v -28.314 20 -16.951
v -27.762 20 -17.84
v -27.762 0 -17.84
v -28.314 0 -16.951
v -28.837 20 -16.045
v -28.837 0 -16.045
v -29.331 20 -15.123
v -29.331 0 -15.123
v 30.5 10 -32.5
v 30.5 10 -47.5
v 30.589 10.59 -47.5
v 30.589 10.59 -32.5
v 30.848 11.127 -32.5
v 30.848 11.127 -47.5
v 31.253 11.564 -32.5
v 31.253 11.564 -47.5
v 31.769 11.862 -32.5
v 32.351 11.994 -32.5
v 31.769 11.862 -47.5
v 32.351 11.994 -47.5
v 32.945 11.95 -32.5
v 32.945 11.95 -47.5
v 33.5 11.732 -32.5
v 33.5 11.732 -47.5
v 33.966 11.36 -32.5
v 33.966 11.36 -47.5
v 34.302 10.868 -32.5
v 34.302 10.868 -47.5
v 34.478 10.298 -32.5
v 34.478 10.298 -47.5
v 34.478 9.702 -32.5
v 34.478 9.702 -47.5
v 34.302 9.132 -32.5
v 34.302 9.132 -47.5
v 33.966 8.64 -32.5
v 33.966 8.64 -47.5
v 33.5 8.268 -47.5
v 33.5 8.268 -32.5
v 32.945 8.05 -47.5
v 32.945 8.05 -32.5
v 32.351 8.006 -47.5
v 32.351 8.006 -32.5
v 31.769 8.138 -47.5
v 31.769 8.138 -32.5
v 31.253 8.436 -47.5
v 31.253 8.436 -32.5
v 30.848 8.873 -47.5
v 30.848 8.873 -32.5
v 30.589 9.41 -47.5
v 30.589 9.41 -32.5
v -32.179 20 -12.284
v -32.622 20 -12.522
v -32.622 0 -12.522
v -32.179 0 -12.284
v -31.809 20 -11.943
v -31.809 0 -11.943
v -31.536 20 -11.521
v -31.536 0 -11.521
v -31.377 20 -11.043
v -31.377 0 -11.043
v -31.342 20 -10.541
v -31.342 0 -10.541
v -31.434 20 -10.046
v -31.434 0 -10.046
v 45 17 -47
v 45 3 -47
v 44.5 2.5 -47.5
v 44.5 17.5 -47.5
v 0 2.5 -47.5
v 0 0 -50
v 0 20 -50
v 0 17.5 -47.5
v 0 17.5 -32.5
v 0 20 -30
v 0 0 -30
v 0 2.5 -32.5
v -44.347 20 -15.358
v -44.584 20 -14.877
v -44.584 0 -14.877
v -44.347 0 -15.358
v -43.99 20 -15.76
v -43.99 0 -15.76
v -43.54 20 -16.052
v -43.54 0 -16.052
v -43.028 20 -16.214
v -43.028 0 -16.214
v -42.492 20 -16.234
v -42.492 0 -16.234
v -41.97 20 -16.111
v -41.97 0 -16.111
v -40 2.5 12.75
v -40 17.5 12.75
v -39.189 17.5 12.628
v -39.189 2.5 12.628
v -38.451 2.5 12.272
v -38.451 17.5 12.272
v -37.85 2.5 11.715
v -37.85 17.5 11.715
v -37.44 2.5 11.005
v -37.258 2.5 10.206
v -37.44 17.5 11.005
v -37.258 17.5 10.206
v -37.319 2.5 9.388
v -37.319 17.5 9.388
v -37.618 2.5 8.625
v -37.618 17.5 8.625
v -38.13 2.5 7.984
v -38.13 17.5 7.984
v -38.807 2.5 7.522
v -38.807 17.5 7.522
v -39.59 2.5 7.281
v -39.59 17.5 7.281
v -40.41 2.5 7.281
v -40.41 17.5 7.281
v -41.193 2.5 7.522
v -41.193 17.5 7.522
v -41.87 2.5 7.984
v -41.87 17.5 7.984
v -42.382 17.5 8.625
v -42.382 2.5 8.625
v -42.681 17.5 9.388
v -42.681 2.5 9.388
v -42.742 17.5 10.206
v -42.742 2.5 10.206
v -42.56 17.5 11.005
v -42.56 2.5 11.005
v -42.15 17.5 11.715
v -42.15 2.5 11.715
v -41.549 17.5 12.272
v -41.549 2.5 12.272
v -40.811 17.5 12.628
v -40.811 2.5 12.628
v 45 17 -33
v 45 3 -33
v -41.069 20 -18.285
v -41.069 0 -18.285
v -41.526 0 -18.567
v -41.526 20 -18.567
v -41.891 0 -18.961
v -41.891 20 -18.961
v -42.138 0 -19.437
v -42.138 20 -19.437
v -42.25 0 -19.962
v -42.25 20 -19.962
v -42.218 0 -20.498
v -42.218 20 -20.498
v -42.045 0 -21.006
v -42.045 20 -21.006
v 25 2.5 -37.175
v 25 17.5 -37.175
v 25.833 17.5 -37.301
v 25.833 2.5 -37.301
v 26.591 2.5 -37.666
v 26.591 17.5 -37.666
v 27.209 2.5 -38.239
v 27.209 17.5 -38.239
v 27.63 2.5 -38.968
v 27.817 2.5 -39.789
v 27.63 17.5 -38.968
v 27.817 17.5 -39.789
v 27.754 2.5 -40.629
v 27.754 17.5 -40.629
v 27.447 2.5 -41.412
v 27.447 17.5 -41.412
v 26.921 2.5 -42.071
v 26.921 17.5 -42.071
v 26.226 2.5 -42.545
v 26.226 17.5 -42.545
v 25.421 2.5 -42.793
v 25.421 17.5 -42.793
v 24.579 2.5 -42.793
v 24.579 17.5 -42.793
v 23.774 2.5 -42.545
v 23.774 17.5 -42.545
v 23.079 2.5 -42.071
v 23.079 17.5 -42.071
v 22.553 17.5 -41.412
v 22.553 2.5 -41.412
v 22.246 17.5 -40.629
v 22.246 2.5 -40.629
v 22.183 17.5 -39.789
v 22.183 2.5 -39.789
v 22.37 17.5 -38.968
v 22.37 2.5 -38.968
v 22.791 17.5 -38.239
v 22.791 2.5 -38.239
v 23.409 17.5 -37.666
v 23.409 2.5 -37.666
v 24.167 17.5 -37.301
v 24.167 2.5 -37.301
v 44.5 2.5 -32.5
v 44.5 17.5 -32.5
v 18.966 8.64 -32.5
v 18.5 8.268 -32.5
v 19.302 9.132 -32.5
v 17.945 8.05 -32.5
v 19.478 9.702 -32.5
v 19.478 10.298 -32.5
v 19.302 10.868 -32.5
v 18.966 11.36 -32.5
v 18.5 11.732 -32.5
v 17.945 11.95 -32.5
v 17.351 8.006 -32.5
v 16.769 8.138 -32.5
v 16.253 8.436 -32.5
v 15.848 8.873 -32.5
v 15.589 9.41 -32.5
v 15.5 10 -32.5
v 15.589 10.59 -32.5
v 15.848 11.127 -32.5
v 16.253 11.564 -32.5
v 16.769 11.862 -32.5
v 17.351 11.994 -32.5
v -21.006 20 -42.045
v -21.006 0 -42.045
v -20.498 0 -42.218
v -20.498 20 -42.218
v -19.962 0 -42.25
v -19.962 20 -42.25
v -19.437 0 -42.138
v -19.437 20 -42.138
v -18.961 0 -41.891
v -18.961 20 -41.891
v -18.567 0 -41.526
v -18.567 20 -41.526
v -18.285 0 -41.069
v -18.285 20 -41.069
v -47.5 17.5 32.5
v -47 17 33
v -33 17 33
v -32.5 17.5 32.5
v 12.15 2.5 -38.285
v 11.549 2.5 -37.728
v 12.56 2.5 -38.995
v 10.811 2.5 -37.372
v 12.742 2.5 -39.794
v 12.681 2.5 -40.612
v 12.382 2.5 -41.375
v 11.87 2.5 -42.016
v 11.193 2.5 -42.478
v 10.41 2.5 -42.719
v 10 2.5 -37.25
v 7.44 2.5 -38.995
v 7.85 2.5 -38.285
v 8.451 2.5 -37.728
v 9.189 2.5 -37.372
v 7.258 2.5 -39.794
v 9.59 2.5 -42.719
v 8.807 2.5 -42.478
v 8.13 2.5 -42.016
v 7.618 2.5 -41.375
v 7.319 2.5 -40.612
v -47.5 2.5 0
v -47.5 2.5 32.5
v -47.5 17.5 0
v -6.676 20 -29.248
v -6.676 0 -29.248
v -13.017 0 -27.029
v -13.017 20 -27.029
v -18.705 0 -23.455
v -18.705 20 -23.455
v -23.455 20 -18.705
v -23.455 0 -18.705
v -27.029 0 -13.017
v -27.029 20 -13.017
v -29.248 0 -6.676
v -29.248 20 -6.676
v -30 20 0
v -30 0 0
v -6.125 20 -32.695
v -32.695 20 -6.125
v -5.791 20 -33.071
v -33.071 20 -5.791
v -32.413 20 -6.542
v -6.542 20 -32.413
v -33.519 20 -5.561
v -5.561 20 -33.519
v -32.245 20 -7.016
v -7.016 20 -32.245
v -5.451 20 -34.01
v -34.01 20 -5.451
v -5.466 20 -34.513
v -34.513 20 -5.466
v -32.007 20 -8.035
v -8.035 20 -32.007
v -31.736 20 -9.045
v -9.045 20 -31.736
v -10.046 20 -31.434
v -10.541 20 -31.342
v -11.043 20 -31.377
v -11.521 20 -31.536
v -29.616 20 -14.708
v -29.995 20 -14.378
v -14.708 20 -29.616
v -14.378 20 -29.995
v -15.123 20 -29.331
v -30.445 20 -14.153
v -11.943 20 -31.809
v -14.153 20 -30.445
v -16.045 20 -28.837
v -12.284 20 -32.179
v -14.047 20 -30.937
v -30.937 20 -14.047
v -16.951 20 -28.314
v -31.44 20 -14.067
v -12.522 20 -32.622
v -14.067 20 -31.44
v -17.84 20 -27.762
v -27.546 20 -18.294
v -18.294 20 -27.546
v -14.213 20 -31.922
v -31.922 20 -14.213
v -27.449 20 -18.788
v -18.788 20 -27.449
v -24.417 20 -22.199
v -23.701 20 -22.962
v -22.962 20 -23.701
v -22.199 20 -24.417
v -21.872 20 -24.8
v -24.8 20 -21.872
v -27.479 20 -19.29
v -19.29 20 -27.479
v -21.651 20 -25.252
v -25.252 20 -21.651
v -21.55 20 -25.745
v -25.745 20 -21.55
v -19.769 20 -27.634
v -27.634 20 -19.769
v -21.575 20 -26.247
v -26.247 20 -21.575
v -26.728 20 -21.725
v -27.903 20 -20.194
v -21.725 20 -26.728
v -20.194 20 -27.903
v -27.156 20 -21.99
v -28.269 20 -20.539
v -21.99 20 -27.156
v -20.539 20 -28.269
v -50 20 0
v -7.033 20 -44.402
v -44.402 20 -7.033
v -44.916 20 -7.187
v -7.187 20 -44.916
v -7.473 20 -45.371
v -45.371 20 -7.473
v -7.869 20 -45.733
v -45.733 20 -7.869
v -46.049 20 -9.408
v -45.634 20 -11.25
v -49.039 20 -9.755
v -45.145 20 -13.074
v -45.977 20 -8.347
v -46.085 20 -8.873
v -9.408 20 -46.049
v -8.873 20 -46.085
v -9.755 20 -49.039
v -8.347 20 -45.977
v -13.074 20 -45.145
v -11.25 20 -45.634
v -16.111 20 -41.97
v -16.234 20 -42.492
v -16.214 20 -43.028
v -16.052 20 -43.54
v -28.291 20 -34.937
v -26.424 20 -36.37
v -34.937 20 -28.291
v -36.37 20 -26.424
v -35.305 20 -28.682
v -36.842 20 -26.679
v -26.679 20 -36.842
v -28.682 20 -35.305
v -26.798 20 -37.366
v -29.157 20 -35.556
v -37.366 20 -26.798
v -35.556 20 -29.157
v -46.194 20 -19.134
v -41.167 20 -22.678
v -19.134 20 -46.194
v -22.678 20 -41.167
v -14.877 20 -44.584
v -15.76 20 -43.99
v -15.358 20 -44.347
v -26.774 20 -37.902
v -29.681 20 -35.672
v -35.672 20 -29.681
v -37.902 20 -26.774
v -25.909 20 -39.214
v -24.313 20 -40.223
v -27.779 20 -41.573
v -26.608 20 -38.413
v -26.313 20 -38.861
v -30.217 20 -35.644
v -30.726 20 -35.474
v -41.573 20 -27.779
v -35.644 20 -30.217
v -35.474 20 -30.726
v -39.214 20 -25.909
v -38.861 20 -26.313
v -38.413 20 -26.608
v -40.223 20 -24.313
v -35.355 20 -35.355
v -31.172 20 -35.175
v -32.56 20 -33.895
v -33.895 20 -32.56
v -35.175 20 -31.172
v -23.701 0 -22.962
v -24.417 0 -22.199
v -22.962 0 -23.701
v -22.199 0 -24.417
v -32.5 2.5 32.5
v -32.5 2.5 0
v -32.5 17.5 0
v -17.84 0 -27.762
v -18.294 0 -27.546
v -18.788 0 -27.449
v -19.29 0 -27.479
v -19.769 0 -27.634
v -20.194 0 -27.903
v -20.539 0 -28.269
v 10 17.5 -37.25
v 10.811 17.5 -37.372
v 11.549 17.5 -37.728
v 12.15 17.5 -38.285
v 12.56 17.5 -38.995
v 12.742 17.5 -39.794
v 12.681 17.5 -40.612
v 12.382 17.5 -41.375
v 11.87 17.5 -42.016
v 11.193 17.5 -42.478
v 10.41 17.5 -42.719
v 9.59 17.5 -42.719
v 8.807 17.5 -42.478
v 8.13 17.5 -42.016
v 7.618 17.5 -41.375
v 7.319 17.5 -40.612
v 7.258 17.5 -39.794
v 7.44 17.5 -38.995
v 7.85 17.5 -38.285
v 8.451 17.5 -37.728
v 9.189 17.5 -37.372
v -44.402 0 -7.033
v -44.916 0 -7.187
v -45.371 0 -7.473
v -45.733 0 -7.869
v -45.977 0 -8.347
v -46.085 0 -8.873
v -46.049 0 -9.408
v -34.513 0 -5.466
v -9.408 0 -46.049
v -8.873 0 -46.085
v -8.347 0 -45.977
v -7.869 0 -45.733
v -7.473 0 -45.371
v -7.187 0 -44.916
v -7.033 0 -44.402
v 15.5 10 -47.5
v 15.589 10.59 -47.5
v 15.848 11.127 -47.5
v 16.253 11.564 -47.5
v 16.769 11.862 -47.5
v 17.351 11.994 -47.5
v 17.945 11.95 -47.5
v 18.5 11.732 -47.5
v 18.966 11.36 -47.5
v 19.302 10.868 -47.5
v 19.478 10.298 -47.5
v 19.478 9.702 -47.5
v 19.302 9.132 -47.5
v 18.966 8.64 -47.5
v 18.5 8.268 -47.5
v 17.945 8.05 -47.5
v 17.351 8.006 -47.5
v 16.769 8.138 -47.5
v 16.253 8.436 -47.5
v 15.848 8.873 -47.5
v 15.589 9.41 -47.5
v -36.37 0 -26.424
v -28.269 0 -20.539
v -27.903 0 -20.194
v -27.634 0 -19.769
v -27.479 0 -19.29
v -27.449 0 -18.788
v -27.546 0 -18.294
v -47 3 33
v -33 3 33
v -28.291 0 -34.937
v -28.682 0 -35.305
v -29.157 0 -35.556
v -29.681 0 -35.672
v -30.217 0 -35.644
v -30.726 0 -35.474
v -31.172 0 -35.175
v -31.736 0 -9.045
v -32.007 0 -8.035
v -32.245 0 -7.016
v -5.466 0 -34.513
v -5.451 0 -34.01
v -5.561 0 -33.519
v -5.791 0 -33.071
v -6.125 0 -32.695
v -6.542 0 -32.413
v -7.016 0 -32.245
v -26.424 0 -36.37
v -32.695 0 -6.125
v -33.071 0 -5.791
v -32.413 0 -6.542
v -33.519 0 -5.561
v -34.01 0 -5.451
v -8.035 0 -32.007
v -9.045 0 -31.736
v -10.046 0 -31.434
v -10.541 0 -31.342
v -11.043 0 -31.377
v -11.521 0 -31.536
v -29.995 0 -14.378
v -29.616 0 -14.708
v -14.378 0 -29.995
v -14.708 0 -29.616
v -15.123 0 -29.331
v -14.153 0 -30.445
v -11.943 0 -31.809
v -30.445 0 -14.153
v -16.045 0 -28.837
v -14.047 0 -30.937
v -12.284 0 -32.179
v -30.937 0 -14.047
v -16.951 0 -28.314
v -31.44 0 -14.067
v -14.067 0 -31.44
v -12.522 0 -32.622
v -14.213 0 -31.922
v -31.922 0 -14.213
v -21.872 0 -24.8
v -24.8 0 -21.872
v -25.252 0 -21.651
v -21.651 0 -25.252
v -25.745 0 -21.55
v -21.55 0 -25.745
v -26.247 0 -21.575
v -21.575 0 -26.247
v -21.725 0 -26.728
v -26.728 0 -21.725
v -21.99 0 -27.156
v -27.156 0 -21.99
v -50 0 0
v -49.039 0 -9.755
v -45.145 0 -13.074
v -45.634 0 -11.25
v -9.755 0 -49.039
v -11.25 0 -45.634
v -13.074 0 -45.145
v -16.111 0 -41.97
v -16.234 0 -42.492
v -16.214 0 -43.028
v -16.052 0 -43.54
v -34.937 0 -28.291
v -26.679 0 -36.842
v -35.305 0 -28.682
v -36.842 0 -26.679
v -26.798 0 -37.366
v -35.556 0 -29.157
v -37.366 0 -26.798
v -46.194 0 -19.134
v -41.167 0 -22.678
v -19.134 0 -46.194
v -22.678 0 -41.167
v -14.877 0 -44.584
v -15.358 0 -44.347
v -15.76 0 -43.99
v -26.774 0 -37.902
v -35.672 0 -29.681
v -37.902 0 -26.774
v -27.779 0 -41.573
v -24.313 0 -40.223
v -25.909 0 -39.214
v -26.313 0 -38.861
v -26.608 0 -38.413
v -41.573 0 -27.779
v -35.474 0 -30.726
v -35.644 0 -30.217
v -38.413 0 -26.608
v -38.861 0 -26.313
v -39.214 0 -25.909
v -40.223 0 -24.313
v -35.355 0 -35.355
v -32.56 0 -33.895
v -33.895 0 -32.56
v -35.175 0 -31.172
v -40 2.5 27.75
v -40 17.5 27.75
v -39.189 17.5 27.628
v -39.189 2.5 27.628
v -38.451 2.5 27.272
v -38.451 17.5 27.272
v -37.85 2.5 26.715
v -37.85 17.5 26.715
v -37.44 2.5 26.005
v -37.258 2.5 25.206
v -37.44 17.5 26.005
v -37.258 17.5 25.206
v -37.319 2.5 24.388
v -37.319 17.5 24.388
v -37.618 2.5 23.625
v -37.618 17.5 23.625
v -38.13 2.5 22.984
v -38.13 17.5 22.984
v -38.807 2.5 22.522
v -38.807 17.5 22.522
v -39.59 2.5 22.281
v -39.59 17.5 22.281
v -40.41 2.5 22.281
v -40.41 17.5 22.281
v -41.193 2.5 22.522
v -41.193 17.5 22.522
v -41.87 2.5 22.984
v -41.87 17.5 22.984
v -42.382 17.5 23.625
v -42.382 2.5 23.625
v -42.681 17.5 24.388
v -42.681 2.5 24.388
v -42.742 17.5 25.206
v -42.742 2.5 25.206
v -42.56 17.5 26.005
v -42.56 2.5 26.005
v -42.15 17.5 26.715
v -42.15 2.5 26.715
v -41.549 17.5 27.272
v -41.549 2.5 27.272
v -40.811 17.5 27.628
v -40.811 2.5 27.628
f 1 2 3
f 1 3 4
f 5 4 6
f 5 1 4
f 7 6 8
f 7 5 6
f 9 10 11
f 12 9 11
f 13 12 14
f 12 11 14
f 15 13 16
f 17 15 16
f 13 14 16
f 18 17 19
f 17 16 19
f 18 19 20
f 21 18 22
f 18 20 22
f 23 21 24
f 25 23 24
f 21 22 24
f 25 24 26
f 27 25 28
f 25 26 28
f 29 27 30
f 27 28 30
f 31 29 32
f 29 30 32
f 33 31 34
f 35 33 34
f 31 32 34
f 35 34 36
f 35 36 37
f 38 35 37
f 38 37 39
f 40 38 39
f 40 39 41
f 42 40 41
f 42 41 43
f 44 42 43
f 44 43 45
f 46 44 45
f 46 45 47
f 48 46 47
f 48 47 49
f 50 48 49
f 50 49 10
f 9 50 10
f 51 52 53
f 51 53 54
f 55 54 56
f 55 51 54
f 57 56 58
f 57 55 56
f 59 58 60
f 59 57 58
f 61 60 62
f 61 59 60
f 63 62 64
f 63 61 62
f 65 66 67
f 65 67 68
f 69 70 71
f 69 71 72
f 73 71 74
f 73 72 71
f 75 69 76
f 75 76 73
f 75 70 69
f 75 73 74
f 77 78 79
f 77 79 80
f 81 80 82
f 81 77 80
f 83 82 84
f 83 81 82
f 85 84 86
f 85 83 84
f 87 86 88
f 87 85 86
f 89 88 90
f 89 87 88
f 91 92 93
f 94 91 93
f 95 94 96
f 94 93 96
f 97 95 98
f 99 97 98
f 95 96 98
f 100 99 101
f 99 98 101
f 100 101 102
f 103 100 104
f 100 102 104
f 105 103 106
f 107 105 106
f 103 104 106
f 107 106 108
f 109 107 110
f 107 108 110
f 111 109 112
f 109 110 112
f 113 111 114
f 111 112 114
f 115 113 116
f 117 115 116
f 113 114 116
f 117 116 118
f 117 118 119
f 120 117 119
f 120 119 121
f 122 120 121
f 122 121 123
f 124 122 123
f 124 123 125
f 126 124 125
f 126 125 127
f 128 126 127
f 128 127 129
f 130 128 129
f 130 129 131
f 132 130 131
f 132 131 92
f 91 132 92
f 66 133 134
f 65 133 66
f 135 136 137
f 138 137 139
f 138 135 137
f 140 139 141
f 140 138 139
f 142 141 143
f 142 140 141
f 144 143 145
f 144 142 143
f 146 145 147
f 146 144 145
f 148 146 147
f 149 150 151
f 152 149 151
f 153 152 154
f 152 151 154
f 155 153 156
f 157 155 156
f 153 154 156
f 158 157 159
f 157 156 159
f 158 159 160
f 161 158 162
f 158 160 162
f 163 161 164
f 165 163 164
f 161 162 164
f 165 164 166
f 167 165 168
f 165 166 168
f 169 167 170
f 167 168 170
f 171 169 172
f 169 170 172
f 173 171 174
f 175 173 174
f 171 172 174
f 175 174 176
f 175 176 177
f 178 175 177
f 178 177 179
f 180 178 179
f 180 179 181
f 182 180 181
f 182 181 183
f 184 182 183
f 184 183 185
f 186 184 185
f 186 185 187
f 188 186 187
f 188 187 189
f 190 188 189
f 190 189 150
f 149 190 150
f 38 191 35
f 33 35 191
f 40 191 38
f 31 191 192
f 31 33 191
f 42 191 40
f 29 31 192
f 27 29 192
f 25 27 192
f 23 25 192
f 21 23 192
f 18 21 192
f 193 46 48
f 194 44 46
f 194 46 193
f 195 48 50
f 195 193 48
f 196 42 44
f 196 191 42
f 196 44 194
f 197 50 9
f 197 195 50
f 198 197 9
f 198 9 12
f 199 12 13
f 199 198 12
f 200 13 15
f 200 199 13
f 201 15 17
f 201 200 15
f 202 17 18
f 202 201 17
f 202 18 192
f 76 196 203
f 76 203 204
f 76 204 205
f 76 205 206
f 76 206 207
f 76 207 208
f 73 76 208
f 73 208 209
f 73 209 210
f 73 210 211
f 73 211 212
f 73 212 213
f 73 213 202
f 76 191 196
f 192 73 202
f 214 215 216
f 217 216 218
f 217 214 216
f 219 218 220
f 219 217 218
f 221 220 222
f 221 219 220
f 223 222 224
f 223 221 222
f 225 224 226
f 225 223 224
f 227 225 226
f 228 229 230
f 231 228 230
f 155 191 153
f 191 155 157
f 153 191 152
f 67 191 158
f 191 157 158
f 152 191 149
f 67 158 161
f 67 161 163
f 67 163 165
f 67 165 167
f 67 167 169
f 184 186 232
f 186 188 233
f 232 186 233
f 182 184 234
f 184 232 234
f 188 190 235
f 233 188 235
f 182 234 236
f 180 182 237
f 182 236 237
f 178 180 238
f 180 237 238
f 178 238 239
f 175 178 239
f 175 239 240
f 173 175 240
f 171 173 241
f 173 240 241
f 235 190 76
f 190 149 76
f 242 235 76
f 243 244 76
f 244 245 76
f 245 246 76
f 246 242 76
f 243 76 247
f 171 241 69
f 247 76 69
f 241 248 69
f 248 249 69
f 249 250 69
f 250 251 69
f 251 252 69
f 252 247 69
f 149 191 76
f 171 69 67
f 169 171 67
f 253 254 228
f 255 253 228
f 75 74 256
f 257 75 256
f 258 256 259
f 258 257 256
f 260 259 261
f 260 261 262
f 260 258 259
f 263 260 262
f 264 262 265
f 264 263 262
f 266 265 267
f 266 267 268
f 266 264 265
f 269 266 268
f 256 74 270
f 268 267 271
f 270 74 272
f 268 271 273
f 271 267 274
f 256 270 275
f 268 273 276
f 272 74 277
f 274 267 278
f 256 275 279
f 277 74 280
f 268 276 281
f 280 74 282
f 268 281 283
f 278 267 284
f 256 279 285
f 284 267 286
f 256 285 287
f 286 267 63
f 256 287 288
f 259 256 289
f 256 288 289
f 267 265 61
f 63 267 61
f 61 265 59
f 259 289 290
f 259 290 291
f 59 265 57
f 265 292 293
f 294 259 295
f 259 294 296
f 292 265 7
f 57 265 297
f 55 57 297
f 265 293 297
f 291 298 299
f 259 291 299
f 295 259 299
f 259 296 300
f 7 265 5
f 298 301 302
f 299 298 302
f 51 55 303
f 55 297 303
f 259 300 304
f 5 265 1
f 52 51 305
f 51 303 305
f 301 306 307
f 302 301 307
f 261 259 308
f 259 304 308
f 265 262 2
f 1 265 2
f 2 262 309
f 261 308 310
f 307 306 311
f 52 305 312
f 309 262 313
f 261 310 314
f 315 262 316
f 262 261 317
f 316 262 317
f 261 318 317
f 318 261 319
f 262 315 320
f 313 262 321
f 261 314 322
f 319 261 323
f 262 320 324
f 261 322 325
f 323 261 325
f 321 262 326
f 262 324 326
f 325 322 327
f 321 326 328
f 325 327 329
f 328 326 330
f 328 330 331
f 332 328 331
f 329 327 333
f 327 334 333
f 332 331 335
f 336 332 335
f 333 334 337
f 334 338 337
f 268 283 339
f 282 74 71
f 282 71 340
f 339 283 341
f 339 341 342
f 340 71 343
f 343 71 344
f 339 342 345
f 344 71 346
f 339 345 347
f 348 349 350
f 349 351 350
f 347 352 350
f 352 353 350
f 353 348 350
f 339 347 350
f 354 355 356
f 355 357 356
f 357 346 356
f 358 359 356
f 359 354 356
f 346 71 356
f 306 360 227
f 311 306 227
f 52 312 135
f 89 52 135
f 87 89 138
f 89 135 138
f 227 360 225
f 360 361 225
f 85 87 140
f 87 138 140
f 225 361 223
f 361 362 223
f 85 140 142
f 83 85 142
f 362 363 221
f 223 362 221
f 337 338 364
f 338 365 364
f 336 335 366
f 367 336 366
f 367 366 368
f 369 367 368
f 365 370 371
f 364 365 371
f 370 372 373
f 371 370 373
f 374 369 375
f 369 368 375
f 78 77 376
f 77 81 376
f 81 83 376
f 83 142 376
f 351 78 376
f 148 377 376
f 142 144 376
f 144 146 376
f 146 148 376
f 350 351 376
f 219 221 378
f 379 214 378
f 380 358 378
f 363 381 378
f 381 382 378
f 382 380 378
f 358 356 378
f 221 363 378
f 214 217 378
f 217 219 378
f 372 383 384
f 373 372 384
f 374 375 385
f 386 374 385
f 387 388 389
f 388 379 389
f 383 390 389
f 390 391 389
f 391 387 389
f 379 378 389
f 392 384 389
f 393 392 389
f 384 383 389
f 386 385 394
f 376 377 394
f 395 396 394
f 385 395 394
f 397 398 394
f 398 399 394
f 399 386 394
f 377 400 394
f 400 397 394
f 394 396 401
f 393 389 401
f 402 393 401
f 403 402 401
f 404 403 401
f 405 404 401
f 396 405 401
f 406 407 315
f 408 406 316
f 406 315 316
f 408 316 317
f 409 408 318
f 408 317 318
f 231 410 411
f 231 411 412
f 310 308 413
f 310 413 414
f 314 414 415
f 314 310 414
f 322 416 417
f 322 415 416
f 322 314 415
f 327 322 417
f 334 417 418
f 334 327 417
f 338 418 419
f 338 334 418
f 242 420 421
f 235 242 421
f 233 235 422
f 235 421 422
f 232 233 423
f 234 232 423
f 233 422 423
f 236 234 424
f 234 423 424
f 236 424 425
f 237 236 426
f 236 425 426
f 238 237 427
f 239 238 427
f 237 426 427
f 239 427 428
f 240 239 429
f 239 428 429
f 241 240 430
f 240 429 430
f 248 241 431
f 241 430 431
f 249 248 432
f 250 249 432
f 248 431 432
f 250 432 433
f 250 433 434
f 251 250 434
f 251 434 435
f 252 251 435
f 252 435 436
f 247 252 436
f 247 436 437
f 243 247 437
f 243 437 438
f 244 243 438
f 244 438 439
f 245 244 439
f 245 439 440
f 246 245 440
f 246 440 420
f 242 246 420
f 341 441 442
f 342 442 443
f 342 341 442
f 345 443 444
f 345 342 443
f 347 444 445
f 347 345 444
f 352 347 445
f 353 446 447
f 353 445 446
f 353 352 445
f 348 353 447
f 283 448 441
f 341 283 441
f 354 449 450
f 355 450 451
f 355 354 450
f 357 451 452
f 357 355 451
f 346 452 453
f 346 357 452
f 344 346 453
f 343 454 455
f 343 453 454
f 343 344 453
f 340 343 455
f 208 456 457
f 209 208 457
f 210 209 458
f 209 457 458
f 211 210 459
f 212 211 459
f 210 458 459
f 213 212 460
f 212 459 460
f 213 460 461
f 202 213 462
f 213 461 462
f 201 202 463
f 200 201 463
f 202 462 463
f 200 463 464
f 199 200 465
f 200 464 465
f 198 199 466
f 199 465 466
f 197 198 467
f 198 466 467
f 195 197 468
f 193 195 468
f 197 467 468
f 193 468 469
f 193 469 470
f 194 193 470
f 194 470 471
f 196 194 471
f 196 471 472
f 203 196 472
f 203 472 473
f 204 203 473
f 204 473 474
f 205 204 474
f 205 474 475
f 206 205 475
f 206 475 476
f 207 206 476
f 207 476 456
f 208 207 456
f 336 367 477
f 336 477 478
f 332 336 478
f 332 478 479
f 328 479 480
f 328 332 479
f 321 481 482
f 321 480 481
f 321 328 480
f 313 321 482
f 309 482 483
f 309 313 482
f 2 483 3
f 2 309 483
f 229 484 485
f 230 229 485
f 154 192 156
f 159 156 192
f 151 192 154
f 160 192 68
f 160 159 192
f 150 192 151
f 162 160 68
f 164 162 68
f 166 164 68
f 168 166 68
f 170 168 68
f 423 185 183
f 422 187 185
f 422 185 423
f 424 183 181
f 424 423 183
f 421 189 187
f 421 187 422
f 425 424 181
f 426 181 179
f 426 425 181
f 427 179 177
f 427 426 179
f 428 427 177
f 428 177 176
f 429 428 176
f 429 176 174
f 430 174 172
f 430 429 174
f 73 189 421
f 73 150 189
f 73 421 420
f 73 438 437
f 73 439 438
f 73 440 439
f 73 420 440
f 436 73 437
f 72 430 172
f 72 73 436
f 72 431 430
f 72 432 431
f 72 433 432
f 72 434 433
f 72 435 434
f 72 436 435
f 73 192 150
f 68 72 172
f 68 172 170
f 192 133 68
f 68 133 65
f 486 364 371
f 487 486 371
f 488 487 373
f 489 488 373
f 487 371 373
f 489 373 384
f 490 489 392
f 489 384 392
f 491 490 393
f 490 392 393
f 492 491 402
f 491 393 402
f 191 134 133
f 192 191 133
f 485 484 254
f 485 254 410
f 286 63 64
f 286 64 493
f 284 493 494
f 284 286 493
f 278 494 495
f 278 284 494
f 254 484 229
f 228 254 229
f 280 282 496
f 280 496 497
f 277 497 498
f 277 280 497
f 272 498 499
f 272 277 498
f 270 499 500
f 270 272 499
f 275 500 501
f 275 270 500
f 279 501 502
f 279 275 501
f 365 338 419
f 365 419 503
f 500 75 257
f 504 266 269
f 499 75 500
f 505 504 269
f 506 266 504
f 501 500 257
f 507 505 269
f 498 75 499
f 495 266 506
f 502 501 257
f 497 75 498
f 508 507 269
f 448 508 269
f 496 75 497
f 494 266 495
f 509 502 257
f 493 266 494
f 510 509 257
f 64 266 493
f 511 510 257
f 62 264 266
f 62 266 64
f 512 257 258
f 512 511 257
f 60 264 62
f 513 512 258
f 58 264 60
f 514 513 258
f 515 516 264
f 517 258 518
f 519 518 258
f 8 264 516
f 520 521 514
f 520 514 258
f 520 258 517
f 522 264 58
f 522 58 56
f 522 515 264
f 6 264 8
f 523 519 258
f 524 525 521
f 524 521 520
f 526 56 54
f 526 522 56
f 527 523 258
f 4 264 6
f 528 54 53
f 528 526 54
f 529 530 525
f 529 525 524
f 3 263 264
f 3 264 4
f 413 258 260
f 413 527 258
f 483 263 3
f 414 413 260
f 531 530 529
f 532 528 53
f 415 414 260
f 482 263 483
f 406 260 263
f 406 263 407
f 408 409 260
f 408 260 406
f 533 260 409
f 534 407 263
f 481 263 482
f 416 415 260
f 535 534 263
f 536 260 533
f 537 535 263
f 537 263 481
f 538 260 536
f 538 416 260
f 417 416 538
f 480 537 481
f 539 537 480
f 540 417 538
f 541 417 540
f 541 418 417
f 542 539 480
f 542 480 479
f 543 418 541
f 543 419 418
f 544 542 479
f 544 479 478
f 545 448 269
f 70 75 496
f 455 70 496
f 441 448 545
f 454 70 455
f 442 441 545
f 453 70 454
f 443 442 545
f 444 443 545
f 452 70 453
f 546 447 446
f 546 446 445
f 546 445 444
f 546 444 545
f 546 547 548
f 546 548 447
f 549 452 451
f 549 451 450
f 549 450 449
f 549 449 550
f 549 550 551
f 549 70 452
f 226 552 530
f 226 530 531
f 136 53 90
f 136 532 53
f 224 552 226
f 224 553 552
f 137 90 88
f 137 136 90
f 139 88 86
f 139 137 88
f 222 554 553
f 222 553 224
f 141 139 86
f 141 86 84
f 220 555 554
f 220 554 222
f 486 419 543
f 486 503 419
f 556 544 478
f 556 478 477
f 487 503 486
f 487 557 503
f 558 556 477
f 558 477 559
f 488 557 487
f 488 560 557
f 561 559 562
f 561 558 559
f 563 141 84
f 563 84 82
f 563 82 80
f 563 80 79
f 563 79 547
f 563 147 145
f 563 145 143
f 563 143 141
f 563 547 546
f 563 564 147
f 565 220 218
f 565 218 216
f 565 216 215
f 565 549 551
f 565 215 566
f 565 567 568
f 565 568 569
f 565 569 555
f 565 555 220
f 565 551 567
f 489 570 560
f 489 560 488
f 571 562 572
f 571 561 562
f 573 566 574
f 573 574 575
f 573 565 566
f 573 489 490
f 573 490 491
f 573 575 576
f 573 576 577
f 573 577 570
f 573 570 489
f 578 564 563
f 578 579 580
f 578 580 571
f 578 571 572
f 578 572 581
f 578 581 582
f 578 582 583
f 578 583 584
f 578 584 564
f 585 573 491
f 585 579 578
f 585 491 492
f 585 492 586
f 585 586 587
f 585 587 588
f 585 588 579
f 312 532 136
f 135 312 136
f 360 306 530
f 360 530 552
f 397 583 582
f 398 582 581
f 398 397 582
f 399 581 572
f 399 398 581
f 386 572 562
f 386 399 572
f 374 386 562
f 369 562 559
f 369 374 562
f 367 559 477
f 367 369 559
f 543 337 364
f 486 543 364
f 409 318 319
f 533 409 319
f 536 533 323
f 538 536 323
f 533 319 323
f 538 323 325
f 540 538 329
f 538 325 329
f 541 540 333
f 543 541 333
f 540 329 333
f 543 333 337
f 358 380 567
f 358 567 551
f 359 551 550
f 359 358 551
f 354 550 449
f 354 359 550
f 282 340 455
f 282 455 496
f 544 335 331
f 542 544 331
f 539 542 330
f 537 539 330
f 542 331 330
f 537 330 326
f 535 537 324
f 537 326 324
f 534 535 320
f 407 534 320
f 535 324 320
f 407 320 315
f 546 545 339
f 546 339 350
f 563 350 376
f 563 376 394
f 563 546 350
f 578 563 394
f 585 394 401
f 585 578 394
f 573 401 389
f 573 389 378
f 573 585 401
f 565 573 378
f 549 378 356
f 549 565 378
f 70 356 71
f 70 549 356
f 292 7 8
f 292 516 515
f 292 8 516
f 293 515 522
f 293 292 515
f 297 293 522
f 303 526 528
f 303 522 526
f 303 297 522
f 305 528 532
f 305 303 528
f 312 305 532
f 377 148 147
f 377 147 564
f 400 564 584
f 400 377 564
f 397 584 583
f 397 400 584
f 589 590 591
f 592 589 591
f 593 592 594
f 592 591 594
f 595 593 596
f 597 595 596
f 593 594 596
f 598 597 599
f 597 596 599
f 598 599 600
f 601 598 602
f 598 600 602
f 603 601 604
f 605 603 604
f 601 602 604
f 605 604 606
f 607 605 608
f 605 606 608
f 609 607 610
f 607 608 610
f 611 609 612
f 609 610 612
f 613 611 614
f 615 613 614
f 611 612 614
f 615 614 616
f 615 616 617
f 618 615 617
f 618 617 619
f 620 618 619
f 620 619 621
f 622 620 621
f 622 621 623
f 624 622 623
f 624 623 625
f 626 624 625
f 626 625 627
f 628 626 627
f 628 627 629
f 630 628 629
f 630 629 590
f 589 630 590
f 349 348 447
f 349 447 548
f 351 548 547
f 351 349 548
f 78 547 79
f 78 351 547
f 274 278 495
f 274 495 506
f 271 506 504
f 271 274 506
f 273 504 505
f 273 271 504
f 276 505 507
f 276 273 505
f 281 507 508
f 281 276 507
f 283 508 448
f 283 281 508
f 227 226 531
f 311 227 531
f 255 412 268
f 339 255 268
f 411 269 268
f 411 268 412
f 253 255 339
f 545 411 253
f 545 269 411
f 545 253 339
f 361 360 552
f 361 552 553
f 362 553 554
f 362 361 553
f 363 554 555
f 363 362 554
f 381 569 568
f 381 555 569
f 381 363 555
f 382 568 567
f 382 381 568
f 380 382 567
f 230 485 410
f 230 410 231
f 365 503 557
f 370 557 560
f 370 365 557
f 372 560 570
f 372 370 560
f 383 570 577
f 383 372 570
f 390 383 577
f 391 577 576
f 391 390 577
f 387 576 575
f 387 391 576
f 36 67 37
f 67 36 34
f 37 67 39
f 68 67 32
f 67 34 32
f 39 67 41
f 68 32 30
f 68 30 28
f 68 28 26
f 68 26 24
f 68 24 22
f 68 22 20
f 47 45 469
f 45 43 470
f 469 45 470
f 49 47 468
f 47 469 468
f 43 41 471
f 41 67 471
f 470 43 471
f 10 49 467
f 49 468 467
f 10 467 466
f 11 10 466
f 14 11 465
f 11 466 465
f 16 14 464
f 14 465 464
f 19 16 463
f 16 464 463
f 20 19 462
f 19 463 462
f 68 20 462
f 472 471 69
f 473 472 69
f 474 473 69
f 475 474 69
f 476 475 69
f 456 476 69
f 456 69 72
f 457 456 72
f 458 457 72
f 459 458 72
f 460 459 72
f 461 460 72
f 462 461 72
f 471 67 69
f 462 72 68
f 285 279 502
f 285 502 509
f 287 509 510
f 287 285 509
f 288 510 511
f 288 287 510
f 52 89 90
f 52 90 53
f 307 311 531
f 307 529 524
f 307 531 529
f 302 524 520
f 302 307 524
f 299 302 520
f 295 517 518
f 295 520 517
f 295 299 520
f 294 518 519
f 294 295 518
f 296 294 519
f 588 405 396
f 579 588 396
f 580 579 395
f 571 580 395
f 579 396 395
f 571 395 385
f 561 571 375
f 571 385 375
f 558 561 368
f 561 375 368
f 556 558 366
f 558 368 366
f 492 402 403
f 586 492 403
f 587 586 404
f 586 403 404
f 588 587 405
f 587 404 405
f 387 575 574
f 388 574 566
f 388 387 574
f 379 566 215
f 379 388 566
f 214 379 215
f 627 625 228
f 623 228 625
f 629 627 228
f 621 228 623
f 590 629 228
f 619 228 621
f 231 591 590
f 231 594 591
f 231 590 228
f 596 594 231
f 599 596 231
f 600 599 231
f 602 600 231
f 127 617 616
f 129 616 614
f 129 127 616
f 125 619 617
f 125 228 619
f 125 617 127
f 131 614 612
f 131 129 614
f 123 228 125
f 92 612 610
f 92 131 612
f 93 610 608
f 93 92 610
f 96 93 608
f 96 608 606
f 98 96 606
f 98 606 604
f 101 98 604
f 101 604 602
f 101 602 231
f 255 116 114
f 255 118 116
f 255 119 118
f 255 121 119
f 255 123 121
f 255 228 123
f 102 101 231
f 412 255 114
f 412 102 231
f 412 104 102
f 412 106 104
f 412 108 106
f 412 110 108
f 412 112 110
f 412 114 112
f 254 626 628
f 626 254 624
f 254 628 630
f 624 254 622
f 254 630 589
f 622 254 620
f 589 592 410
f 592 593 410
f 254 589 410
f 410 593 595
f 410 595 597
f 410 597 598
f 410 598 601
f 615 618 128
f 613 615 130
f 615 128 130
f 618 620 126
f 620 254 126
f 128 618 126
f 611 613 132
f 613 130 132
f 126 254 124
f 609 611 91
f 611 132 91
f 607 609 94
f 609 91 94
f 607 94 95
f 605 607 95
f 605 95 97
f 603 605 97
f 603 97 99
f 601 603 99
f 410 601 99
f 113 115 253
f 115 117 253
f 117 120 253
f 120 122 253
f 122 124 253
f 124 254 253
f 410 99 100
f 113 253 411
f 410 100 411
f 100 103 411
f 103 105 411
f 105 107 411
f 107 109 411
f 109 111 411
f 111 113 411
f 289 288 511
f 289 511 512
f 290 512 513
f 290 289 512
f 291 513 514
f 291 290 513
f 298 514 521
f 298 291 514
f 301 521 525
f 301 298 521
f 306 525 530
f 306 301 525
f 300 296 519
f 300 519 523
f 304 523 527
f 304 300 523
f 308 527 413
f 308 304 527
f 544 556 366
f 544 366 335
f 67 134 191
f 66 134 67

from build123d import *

# Parameters (mm, degrees)
BOSS_EXTRUDE1_DEPTH = 20
SKETCH2_W           = 15
SKETCH2_H           = 15
BOSS_EXTRUDE2_DEPTH = 33
SKETCH3_W           = 15
SKETCH3_H           = 15
BOSS_EXTRUDE3_DEPTH = 45
SKETCH4_R           = 2.75
SKETCH4_R_2         = 2.825
CUT_EXTRUDE1_DEPTH  = 73.844011422
CUT_EXTRUDE2_DEPTH  = 74.484692283
CHAMFER1_SIZE       = 0.5
SKETCH6_R           = 2
CUT_EXTRUDE3_DEPTH  = 20


with BuildPart() as part:
    # Sketch1 → Boss-Extrude1 (new body)
    with BuildSketch(Plane(origin=(0, 0, 0), x_dir=(1, 0, 0), z_dir=(0, 1, 0))):
        with BuildLine():
            Line((0, 50), (0, 30))
            ThreePointArc((0, 30), (-21.213203436, 21.213203436), (-30, 0))
            Line((-30, 0), (-50, 0))
            ThreePointArc((-50, 0), (-35.355339059, 35.355339059), (0, 50))
        make_face()
    extrude(amount=BOSS_EXTRUDE1_DEPTH)

    # Sketch2 → Boss-Extrude2 (add)
    with BuildSketch(Plane.XY):
        with Locations((-40, 10)):
            Rectangle(SKETCH2_W, SKETCH2_H)
    extrude(amount=BOSS_EXTRUDE2_DEPTH)

    # Sketch3 → Boss-Extrude3 (add)
    with BuildSketch(Plane(origin=(0, 0, 0), x_dir=(0, 0, -1), z_dir=(1, 0, 0))):
        with Locations((40, 10)):
            Rectangle(SKETCH3_W, SKETCH3_H)
    extrude(amount=BOSS_EXTRUDE3_DEPTH)

    # Sketch4 → Cut-Extrude1 (cut, through all)
    with BuildSketch(Plane(origin=(0, 17.5, 0), x_dir=(1, 0, 0), z_dir=(0, 1, 0))):
        with Locations(Location((10, 40, 0), (0, 0, 270))):
            Circle(SKETCH4_R)
        with Locations(Location((25, 40, 0), (0, 0, 270))):
            Circle(SKETCH4_R_2)
        with Locations(Location((-40, -10, 0), (0, 0, 270))):
            Circle(SKETCH4_R)
        with Locations(Location((-40, -25, 0), (0, 0, 270))):
            Circle(SKETCH4_R)
    extrude(amount=-CUT_EXTRUDE1_DEPTH, mode=Mode.SUBTRACT)

    # Sketch5 → Cut-Extrude2 (cut, through all)
    with BuildSketch(Plane(origin=(0, 20, 0), x_dir=(1, 0, 0), z_dir=(0, 1, 0))):
        with BuildLine():
            Line((-21.990223117, 27.155663999), (-28.291433976, 34.937011371))
            ThreePointArc((-28.291433976, 34.937011371), (-29.68093252, 35.671569812), (-31.172202606, 35.17518706))
            ThreePointArc((-31.172202606, 35.17518706), (-33.234018716, 33.234018716), (-35.17518706, 31.172202606))
            ThreePointArc((-35.17518706, 31.172202606), (-35.671569812, 29.68093252), (-34.937011371, 28.291433976))
            Line((-34.937011371, 28.291433976), (-27.155663999, 21.990223117))
            ThreePointArc((-27.155663999, 21.990223117), (-25.744904759, 21.550308438), (-24.417193319, 22.199114181))
            ThreePointArc((-24.417193319, 22.199114181), (-23.334523779, 23.334523779), (-22.199114181, 24.417193319))
            ThreePointArc((-22.199114181, 24.417193319), (-21.550308438, 25.744904759), (-21.990223117, 27.155663999))
        make_face()
        with BuildLine():
            Line((-20.538868638, 28.26932746), (-26.424199651, 36.369790662))
            ThreePointArc((-26.424199651, 36.369790662), (-26.774099933, 37.902060905), (-25.908661914, 39.214043885))
            ThreePointArc((-25.908661914, 39.214043885), (-23.5, 40.703193978), (-21.006027233, 42.044581338))
            ThreePointArc((-21.006027233, 42.044581338), (-19.437097633, 42.138081158), (-18.285062818, 41.068923503))
            Line((-18.285062818, 41.068923503), (-14.21252141, 31.921845736))
            ThreePointArc((-14.21252141, 31.921845736), (-14.152727818, 30.445298653), (-15.123063049, 29.330751167))
            ThreePointArc((-15.123063049, 29.330751167), (-16.5, 28.578838325), (-17.839644098, 27.762332367))
            ThreePointArc((-17.839644098, 27.762332367), (-19.290038151, 27.47927115), (-20.538868638, 28.26932746))
        make_face()
        with BuildLine():
            Line((-12.522383321, 32.621923854), (-16.110622392, 41.969606219))
            ThreePointArc((-16.110622392, 41.969606219), (-16.05201939, 43.540226476), (-14.876504274, 44.583512878))
            ThreePointArc((-14.876504274, 44.583512878), (-12.16449512, 45.398513836), (-9.408325818, 46.04870688))
            ThreePointArc((-9.408325818, 46.04870688), (-7.868656664, 45.73295191), (-7.032594847, 44.402056368))
            Line((-7.032594847, 44.402056368), (-5.466259855, 34.512606439))
            ThreePointArc((-5.466259855, 34.512606439), (-5.790662187, 33.070895758), (-7.016400163, 32.245466794))
            ThreePointArc((-7.016400163, 32.245466794), (-8.541028488, 31.875552268), (-10.046352613, 31.433593482))
            ThreePointArc((-10.046352613, 31.433593482), (-11.52058732, 31.535566946), (-12.522383321, 32.621923854))
        make_face()
        with BuildLine():
            Line((-31.921845736, 14.21252141), (-41.068923503, 18.285062818))
            ThreePointArc((-41.068923503, 18.285062818), (-42.138081158, 19.437097633), (-42.044581338, 21.006027233))
            ThreePointArc((-42.044581338, 21.006027233), (-40.703193978, 23.5), (-39.214043885, 25.908661914))
            ThreePointArc((-39.214043885, 25.908661914), (-37.902060905, 26.774099933), (-36.369790662, 26.424199651))
            Line((-36.369790662, 26.424199651), (-28.26932746, 20.538868638))
            ThreePointArc((-28.26932746, 20.538868638), (-27.47927115, 19.290038151), (-27.762332367, 17.839644098))
            ThreePointArc((-27.762332367, 17.839644098), (-28.578838325, 16.5), (-29.330751167, 15.123063049))
            ThreePointArc((-29.330751167, 15.123063049), (-30.445298653, 14.152727818), (-31.921845736, 14.21252141))
        make_face()
        with BuildLine():
            Line((-34.512606439, 5.466259855), (-44.402056368, 7.032594847))
            ThreePointArc((-44.402056368, 7.032594847), (-45.73295191, 7.868656664), (-46.04870688, 9.408325818))
            ThreePointArc((-46.04870688, 9.408325818), (-45.398513836, 12.16449512), (-44.583512878, 14.876504274))
            ThreePointArc((-44.583512878, 14.876504274), (-43.540226476, 16.05201939), (-41.969606219, 16.110622392))
            Line((-41.969606219, 16.110622392), (-32.621923854, 12.522383321))
            ThreePointArc((-32.621923854, 12.522383321), (-31.535566946, 11.52058732), (-31.433593482, 10.046352613))
            ThreePointArc((-31.433593482, 10.046352613), (-31.875552268, 8.541028488), (-32.245466794, 7.016400163))
            ThreePointArc((-32.245466794, 7.016400163), (-33.070895758, 5.790662187), (-34.512606439, 5.466259855))
        make_face()
    extrude(amount=-CUT_EXTRUDE2_DEPTH, mode=Mode.SUBTRACT)

    # Chamfer1
    chamfer1_edges = [part.edges().sort_by_distance(p)[0] for p in [
        (-32.5, 10, 33),
        (-40, 17.5, 33),
        (-47.5, 10, 33),
        (-40, 2.5, 33),
        (45, 10, -47.5),
        (45, 17.5, -40),
        (45, 10, -32.5),
        (45, 2.5, -40),
    ]]
    chamfer(chamfer1_edges, length=CHAMFER1_SIZE)

    # Sketch6 → Cut-Extrude3 (cut)
    with BuildSketch(Plane(origin=(0, 0, -47.5), x_dir=(-1, 0, 0), z_dir=(0, 0, -1))):
        with Locations((-17.5, 10)):
            Circle(SKETCH6_R)
        with Locations((-32.5, 10)):
            Circle(SKETCH6_R)
    extrude(amount=-CUT_EXTRUDE3_DEPTH, mode=Mode.SUBTRACT)


solid = part.part
